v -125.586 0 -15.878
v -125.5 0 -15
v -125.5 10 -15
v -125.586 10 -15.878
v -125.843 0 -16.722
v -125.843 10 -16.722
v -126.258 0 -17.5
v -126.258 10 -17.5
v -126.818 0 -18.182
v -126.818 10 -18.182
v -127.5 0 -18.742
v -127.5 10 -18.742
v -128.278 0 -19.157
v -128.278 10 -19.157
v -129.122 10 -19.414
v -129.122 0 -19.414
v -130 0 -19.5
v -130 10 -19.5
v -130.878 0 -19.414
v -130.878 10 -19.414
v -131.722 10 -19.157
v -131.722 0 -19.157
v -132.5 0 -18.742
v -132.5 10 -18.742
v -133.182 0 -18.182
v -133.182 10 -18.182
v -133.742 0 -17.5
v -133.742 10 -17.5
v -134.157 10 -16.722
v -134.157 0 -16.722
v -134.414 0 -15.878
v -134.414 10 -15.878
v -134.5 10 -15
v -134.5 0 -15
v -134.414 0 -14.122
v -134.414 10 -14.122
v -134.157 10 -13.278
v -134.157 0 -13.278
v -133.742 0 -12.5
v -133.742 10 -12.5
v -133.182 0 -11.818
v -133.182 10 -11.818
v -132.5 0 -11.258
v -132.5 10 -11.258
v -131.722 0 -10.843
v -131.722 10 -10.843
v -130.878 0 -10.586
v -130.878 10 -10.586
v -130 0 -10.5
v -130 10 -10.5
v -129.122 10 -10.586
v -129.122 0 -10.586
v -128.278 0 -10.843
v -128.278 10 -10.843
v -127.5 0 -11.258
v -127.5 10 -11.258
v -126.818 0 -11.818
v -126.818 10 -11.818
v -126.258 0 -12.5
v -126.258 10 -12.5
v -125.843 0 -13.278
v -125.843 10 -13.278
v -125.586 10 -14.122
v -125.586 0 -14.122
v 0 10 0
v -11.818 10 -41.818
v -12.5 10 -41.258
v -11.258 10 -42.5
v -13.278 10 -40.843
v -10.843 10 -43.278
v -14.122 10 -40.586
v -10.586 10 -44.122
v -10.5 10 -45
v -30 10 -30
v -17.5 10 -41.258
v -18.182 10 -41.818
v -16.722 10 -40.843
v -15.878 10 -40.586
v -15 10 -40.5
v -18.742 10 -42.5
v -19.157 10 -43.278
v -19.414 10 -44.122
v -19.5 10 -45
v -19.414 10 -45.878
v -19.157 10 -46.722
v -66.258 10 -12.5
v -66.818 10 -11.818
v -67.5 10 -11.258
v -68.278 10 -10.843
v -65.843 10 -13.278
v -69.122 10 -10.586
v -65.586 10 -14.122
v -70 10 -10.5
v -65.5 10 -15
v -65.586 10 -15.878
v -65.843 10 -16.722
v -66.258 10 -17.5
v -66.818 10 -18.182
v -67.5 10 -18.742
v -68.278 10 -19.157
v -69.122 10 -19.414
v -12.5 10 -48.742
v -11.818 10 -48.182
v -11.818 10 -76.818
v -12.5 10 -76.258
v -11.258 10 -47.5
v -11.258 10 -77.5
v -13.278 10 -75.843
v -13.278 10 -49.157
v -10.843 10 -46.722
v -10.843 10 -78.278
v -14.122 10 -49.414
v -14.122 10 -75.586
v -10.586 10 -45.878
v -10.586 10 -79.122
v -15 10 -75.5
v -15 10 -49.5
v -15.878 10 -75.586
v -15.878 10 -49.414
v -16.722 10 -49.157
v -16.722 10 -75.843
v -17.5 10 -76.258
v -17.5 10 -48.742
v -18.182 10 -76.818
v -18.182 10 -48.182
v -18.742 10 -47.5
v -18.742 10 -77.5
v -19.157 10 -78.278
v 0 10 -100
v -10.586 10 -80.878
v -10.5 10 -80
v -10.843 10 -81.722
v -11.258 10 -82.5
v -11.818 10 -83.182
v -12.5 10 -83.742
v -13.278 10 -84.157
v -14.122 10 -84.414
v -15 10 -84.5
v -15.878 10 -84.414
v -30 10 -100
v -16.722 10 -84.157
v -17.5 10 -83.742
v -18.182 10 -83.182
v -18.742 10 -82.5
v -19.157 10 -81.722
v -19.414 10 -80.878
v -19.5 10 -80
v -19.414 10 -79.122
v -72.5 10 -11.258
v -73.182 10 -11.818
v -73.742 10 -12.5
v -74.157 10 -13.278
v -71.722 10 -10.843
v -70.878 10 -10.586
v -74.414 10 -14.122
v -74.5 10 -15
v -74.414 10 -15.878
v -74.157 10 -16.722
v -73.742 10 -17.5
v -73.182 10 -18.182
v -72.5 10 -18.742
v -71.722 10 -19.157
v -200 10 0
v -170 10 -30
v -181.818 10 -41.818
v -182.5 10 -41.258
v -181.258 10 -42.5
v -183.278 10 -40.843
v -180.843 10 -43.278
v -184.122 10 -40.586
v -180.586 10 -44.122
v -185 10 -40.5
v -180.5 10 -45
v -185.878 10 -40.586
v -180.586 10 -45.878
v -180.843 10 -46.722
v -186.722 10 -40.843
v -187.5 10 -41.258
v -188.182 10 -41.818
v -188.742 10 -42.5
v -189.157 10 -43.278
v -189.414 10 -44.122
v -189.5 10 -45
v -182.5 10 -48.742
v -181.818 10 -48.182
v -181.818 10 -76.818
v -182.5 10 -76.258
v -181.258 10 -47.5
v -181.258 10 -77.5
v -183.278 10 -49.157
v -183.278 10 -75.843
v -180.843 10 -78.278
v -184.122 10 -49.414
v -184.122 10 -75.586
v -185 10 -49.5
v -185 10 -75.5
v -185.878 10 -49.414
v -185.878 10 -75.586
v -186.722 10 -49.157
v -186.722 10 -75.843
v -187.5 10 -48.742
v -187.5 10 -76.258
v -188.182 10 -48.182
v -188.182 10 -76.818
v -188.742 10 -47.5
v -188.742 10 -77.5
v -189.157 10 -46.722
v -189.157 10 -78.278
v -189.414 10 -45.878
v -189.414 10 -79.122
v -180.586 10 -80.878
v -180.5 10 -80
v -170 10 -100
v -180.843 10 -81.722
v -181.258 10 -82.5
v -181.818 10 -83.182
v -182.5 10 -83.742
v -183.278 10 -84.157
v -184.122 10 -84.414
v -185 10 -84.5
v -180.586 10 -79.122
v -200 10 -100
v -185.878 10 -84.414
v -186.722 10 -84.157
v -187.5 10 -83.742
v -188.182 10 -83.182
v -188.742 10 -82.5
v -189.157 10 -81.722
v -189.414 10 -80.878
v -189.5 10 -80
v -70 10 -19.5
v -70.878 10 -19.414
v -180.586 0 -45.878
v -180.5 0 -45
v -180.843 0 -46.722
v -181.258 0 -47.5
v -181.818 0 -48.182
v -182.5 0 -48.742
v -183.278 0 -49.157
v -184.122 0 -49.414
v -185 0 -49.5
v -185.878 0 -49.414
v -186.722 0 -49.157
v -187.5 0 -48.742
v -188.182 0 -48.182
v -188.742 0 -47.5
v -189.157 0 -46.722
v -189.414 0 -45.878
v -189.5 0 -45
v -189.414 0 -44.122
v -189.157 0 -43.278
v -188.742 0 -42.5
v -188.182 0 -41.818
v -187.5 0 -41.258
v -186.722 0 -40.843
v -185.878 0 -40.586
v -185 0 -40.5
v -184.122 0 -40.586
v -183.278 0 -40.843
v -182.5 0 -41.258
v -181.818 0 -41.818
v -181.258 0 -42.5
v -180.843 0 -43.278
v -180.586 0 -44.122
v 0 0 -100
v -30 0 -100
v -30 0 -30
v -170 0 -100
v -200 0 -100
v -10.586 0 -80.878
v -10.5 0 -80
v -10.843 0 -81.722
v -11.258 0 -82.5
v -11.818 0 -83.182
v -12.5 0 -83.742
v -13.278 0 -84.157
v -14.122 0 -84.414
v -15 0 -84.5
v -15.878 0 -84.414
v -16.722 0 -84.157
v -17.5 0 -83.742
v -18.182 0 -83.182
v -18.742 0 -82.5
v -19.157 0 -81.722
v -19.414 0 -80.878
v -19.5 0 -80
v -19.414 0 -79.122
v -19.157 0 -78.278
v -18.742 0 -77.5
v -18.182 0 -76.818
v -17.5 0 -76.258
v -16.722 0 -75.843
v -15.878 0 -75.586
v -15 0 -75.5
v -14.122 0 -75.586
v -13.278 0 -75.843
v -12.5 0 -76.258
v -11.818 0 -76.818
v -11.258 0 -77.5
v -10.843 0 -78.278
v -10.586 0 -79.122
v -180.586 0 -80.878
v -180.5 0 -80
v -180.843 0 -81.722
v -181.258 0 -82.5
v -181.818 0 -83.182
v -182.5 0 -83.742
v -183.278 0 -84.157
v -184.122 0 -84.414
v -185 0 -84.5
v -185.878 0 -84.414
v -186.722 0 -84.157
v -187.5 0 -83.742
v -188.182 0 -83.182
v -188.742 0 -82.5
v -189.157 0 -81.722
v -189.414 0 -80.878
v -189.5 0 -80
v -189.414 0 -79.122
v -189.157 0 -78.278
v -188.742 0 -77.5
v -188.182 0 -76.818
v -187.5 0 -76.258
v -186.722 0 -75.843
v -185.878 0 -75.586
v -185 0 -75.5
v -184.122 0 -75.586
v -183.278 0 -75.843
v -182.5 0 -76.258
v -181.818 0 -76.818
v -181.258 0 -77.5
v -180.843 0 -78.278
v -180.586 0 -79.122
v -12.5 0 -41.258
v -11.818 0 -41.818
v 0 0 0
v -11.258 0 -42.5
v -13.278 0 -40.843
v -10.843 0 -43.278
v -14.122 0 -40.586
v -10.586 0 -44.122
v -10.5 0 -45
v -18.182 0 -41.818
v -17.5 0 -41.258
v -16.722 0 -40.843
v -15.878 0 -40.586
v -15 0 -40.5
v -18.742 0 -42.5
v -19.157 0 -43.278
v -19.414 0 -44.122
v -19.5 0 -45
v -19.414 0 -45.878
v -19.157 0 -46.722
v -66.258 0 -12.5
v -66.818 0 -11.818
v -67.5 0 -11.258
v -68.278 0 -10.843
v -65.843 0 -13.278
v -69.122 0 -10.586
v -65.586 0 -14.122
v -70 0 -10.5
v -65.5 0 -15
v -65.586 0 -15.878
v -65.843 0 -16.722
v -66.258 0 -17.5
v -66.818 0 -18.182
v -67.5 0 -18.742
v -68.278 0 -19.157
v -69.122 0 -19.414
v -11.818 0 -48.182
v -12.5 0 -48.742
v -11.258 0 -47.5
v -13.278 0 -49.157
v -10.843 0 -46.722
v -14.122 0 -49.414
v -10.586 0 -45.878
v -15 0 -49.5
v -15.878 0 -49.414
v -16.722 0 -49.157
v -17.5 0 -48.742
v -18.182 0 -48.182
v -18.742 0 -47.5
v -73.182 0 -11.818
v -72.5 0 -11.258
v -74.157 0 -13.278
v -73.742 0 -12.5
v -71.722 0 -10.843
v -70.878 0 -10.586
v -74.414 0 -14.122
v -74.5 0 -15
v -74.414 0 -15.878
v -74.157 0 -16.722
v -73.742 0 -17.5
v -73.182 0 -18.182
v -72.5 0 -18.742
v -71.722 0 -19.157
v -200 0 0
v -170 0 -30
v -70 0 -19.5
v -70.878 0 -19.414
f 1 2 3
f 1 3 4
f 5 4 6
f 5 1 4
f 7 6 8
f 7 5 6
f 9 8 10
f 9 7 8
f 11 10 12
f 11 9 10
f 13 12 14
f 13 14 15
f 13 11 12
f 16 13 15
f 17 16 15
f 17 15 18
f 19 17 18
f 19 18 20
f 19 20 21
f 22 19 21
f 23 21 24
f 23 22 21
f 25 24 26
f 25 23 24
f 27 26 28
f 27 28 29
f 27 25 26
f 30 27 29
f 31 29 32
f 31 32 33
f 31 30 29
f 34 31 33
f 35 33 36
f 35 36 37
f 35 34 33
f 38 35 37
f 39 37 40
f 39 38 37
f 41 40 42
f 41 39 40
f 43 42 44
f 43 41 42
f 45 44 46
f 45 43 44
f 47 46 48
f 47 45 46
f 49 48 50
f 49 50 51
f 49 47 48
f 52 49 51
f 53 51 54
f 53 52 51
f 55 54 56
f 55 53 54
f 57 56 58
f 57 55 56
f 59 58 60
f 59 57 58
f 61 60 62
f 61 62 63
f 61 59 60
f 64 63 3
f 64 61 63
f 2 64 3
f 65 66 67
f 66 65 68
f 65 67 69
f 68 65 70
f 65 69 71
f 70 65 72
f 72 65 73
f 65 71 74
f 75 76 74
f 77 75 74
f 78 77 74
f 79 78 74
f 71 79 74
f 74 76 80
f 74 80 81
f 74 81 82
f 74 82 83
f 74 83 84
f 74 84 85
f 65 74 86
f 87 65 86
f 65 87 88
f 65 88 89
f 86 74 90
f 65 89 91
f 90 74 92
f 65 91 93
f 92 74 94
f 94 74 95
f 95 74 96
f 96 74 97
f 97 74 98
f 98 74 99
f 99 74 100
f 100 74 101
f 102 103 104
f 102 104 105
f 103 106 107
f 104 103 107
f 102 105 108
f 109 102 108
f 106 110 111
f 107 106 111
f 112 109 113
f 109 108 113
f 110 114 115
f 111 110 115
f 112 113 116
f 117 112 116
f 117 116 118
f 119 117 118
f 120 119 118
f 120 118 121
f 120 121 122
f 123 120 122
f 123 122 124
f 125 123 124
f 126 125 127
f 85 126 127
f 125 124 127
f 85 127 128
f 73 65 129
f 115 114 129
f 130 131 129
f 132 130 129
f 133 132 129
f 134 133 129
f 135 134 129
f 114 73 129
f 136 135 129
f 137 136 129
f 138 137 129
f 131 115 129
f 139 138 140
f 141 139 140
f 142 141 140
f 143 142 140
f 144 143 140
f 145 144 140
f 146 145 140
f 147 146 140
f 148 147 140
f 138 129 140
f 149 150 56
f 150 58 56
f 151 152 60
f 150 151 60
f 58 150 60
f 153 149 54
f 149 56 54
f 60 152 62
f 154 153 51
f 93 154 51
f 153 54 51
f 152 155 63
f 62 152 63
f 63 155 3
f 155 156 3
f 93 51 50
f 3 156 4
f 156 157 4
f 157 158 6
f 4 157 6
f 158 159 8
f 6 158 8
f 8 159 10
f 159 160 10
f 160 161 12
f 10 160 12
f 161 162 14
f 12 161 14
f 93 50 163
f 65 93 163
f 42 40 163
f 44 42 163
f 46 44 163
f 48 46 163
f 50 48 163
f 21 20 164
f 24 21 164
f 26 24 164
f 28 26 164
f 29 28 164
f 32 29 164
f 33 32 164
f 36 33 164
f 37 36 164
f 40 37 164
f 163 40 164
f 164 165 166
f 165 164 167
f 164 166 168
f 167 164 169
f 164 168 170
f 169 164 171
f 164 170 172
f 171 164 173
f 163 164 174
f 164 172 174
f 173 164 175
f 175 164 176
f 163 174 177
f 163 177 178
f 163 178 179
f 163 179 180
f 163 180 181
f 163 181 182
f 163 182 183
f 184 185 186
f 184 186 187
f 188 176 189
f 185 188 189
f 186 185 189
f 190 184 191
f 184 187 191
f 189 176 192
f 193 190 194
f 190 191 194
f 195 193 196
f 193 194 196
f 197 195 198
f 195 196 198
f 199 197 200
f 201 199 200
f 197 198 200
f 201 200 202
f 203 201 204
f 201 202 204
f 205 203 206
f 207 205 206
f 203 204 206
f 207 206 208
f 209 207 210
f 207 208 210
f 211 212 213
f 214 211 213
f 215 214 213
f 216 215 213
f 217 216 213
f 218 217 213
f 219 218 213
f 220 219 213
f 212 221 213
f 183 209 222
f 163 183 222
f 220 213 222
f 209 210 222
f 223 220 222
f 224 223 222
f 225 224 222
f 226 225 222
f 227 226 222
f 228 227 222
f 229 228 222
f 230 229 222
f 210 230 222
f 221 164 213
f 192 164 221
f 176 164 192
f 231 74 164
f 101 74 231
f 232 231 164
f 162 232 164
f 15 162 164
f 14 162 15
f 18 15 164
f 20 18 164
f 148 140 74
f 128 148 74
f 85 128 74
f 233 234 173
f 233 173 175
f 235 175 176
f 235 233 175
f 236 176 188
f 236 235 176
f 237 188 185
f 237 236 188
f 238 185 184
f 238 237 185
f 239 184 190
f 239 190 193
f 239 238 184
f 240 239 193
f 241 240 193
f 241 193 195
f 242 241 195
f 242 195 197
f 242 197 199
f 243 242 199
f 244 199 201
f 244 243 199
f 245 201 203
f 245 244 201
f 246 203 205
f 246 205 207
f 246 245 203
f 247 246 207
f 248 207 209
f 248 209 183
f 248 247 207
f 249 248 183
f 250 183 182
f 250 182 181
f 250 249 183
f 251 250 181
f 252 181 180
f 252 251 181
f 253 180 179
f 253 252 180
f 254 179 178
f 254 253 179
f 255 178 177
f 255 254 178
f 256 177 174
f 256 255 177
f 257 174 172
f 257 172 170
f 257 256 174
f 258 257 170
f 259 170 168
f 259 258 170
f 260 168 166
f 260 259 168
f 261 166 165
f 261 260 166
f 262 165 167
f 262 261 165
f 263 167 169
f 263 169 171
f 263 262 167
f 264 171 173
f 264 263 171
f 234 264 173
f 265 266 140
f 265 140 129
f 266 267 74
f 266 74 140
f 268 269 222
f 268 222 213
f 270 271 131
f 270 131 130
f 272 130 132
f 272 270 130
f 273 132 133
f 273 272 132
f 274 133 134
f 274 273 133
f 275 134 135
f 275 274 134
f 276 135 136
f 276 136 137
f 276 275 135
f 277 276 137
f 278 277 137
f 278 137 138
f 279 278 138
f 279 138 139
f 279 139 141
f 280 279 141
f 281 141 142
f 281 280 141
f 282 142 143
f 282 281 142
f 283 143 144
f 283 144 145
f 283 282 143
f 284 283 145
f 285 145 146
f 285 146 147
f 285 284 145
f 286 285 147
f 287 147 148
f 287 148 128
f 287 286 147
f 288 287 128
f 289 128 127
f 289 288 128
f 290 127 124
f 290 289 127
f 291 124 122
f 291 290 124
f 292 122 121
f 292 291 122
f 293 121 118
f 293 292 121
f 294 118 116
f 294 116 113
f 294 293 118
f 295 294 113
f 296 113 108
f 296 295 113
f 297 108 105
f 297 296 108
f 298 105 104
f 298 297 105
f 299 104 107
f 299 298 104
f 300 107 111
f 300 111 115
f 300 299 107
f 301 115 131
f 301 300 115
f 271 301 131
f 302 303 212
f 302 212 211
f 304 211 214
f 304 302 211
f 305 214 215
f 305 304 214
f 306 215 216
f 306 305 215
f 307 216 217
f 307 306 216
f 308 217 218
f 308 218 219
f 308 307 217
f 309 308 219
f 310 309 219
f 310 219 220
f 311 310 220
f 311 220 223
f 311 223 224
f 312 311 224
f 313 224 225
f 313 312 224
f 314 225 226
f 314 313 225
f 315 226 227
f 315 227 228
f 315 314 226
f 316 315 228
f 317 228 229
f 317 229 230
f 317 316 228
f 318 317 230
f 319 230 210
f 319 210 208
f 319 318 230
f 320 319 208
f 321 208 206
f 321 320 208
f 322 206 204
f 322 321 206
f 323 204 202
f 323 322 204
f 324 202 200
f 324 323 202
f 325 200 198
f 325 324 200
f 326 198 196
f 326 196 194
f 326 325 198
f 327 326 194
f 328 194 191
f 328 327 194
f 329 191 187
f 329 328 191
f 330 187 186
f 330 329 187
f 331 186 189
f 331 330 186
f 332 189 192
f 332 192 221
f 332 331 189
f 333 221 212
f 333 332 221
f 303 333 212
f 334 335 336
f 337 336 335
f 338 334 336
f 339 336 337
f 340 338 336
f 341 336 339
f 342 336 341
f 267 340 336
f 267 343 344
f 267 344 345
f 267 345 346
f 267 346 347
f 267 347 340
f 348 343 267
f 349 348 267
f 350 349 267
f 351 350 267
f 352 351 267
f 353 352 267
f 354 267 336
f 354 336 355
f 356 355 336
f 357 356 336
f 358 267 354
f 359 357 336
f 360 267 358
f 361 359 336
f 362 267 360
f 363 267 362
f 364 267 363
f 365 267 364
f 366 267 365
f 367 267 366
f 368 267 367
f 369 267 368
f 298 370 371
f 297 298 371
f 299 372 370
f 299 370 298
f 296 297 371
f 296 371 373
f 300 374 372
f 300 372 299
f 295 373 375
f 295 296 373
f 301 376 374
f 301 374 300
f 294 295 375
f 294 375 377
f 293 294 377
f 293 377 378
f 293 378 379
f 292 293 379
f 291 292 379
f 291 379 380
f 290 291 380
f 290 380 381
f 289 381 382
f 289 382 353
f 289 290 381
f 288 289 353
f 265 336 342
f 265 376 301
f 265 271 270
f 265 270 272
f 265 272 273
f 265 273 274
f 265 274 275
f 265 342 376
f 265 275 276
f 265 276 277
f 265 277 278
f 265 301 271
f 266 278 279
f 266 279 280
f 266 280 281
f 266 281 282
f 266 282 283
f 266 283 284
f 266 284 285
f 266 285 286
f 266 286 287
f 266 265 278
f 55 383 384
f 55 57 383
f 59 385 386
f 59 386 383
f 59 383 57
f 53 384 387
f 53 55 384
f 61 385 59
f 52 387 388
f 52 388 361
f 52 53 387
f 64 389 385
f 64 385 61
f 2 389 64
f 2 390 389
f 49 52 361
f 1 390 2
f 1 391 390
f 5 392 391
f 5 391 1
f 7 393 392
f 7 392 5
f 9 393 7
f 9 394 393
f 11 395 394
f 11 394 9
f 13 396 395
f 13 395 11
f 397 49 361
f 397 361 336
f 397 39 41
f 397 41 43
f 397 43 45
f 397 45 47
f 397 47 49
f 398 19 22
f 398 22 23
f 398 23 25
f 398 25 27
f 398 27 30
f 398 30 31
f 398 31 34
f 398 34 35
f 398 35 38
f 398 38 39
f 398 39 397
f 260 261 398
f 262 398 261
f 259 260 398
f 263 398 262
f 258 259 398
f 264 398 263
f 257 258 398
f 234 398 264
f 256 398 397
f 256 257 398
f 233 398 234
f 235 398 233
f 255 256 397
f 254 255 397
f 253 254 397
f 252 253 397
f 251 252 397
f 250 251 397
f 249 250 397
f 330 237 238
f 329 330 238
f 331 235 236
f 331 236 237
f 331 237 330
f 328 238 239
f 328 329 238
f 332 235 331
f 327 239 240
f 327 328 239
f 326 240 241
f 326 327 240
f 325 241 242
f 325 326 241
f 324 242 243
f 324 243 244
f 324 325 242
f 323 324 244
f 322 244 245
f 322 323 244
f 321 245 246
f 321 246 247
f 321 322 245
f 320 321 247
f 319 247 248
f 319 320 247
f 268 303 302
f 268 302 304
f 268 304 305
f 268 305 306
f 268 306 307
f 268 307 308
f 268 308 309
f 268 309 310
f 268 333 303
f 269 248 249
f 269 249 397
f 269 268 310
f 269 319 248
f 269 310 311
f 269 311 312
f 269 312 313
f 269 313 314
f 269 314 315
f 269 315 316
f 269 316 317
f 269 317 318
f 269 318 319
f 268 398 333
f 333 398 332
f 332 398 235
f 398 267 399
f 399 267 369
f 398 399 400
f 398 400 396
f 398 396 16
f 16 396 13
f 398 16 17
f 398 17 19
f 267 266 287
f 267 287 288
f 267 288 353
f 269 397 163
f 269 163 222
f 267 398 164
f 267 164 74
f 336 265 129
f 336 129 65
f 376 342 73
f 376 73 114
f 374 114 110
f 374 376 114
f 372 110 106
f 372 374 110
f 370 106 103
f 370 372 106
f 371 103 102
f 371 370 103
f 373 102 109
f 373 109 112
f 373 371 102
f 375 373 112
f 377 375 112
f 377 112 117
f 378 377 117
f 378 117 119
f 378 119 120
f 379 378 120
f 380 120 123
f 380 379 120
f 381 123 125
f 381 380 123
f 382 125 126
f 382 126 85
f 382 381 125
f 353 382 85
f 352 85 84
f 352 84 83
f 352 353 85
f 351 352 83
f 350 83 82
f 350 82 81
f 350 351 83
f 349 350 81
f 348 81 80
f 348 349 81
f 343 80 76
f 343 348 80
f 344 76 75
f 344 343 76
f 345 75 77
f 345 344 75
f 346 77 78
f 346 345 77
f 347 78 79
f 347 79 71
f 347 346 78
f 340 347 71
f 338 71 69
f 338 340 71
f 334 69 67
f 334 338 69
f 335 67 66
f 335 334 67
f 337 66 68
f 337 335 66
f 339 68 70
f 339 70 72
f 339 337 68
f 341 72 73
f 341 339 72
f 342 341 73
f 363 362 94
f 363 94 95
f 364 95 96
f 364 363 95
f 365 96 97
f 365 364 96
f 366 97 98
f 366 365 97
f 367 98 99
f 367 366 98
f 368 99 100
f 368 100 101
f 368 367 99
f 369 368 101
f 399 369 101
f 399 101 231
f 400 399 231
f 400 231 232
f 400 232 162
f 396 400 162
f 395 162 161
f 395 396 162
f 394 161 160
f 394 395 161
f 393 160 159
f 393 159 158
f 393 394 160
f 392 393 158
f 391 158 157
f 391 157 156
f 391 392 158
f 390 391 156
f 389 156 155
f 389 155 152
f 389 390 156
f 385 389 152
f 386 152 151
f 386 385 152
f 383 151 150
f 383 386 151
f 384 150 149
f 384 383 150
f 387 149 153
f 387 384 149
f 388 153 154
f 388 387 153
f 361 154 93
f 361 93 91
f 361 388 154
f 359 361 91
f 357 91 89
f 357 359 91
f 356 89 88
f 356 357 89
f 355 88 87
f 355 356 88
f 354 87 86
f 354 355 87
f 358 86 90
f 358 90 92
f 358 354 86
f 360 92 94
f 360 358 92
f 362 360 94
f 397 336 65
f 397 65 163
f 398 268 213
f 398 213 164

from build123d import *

# Parameters (mm, degrees)
SKETCH1_R           = 4.5
BOSS_EXTRUDE1_DEPTH = 10


with BuildPart() as part:
    # Sketch1 → Boss-Extrude1 (new body)
    with BuildSketch(Plane(origin=(0, 0, 0), x_dir=(1, 0, 0), z_dir=(0, 1, 0))):
        Polygon((0, 0), (-200, 0), (-200, 100), (-170, 100), (-170, 30), (-30, 30), (-30, 100), (0, 100), align=None)
        with Locations((-15, 80)):
            Circle(SKETCH1_R, mode=Mode.SUBTRACT)
        with Locations((-15, 45)):
            Circle(SKETCH1_R, mode=Mode.SUBTRACT)
        with Locations((-130, 15)):
            Circle(SKETCH1_R, mode=Mode.SUBTRACT)
        with Locations((-70, 15)):
            Circle(SKETCH1_R, mode=Mode.SUBTRACT)
        with Locations((-185, 80)):
            Circle(SKETCH1_R, mode=Mode.SUBTRACT)
        with Locations((-185, 45)):
            Circle(SKETCH1_R, mode=Mode.SUBTRACT)
    extrude(amount=BOSS_EXTRUDE1_DEPTH)


solid = part.part
